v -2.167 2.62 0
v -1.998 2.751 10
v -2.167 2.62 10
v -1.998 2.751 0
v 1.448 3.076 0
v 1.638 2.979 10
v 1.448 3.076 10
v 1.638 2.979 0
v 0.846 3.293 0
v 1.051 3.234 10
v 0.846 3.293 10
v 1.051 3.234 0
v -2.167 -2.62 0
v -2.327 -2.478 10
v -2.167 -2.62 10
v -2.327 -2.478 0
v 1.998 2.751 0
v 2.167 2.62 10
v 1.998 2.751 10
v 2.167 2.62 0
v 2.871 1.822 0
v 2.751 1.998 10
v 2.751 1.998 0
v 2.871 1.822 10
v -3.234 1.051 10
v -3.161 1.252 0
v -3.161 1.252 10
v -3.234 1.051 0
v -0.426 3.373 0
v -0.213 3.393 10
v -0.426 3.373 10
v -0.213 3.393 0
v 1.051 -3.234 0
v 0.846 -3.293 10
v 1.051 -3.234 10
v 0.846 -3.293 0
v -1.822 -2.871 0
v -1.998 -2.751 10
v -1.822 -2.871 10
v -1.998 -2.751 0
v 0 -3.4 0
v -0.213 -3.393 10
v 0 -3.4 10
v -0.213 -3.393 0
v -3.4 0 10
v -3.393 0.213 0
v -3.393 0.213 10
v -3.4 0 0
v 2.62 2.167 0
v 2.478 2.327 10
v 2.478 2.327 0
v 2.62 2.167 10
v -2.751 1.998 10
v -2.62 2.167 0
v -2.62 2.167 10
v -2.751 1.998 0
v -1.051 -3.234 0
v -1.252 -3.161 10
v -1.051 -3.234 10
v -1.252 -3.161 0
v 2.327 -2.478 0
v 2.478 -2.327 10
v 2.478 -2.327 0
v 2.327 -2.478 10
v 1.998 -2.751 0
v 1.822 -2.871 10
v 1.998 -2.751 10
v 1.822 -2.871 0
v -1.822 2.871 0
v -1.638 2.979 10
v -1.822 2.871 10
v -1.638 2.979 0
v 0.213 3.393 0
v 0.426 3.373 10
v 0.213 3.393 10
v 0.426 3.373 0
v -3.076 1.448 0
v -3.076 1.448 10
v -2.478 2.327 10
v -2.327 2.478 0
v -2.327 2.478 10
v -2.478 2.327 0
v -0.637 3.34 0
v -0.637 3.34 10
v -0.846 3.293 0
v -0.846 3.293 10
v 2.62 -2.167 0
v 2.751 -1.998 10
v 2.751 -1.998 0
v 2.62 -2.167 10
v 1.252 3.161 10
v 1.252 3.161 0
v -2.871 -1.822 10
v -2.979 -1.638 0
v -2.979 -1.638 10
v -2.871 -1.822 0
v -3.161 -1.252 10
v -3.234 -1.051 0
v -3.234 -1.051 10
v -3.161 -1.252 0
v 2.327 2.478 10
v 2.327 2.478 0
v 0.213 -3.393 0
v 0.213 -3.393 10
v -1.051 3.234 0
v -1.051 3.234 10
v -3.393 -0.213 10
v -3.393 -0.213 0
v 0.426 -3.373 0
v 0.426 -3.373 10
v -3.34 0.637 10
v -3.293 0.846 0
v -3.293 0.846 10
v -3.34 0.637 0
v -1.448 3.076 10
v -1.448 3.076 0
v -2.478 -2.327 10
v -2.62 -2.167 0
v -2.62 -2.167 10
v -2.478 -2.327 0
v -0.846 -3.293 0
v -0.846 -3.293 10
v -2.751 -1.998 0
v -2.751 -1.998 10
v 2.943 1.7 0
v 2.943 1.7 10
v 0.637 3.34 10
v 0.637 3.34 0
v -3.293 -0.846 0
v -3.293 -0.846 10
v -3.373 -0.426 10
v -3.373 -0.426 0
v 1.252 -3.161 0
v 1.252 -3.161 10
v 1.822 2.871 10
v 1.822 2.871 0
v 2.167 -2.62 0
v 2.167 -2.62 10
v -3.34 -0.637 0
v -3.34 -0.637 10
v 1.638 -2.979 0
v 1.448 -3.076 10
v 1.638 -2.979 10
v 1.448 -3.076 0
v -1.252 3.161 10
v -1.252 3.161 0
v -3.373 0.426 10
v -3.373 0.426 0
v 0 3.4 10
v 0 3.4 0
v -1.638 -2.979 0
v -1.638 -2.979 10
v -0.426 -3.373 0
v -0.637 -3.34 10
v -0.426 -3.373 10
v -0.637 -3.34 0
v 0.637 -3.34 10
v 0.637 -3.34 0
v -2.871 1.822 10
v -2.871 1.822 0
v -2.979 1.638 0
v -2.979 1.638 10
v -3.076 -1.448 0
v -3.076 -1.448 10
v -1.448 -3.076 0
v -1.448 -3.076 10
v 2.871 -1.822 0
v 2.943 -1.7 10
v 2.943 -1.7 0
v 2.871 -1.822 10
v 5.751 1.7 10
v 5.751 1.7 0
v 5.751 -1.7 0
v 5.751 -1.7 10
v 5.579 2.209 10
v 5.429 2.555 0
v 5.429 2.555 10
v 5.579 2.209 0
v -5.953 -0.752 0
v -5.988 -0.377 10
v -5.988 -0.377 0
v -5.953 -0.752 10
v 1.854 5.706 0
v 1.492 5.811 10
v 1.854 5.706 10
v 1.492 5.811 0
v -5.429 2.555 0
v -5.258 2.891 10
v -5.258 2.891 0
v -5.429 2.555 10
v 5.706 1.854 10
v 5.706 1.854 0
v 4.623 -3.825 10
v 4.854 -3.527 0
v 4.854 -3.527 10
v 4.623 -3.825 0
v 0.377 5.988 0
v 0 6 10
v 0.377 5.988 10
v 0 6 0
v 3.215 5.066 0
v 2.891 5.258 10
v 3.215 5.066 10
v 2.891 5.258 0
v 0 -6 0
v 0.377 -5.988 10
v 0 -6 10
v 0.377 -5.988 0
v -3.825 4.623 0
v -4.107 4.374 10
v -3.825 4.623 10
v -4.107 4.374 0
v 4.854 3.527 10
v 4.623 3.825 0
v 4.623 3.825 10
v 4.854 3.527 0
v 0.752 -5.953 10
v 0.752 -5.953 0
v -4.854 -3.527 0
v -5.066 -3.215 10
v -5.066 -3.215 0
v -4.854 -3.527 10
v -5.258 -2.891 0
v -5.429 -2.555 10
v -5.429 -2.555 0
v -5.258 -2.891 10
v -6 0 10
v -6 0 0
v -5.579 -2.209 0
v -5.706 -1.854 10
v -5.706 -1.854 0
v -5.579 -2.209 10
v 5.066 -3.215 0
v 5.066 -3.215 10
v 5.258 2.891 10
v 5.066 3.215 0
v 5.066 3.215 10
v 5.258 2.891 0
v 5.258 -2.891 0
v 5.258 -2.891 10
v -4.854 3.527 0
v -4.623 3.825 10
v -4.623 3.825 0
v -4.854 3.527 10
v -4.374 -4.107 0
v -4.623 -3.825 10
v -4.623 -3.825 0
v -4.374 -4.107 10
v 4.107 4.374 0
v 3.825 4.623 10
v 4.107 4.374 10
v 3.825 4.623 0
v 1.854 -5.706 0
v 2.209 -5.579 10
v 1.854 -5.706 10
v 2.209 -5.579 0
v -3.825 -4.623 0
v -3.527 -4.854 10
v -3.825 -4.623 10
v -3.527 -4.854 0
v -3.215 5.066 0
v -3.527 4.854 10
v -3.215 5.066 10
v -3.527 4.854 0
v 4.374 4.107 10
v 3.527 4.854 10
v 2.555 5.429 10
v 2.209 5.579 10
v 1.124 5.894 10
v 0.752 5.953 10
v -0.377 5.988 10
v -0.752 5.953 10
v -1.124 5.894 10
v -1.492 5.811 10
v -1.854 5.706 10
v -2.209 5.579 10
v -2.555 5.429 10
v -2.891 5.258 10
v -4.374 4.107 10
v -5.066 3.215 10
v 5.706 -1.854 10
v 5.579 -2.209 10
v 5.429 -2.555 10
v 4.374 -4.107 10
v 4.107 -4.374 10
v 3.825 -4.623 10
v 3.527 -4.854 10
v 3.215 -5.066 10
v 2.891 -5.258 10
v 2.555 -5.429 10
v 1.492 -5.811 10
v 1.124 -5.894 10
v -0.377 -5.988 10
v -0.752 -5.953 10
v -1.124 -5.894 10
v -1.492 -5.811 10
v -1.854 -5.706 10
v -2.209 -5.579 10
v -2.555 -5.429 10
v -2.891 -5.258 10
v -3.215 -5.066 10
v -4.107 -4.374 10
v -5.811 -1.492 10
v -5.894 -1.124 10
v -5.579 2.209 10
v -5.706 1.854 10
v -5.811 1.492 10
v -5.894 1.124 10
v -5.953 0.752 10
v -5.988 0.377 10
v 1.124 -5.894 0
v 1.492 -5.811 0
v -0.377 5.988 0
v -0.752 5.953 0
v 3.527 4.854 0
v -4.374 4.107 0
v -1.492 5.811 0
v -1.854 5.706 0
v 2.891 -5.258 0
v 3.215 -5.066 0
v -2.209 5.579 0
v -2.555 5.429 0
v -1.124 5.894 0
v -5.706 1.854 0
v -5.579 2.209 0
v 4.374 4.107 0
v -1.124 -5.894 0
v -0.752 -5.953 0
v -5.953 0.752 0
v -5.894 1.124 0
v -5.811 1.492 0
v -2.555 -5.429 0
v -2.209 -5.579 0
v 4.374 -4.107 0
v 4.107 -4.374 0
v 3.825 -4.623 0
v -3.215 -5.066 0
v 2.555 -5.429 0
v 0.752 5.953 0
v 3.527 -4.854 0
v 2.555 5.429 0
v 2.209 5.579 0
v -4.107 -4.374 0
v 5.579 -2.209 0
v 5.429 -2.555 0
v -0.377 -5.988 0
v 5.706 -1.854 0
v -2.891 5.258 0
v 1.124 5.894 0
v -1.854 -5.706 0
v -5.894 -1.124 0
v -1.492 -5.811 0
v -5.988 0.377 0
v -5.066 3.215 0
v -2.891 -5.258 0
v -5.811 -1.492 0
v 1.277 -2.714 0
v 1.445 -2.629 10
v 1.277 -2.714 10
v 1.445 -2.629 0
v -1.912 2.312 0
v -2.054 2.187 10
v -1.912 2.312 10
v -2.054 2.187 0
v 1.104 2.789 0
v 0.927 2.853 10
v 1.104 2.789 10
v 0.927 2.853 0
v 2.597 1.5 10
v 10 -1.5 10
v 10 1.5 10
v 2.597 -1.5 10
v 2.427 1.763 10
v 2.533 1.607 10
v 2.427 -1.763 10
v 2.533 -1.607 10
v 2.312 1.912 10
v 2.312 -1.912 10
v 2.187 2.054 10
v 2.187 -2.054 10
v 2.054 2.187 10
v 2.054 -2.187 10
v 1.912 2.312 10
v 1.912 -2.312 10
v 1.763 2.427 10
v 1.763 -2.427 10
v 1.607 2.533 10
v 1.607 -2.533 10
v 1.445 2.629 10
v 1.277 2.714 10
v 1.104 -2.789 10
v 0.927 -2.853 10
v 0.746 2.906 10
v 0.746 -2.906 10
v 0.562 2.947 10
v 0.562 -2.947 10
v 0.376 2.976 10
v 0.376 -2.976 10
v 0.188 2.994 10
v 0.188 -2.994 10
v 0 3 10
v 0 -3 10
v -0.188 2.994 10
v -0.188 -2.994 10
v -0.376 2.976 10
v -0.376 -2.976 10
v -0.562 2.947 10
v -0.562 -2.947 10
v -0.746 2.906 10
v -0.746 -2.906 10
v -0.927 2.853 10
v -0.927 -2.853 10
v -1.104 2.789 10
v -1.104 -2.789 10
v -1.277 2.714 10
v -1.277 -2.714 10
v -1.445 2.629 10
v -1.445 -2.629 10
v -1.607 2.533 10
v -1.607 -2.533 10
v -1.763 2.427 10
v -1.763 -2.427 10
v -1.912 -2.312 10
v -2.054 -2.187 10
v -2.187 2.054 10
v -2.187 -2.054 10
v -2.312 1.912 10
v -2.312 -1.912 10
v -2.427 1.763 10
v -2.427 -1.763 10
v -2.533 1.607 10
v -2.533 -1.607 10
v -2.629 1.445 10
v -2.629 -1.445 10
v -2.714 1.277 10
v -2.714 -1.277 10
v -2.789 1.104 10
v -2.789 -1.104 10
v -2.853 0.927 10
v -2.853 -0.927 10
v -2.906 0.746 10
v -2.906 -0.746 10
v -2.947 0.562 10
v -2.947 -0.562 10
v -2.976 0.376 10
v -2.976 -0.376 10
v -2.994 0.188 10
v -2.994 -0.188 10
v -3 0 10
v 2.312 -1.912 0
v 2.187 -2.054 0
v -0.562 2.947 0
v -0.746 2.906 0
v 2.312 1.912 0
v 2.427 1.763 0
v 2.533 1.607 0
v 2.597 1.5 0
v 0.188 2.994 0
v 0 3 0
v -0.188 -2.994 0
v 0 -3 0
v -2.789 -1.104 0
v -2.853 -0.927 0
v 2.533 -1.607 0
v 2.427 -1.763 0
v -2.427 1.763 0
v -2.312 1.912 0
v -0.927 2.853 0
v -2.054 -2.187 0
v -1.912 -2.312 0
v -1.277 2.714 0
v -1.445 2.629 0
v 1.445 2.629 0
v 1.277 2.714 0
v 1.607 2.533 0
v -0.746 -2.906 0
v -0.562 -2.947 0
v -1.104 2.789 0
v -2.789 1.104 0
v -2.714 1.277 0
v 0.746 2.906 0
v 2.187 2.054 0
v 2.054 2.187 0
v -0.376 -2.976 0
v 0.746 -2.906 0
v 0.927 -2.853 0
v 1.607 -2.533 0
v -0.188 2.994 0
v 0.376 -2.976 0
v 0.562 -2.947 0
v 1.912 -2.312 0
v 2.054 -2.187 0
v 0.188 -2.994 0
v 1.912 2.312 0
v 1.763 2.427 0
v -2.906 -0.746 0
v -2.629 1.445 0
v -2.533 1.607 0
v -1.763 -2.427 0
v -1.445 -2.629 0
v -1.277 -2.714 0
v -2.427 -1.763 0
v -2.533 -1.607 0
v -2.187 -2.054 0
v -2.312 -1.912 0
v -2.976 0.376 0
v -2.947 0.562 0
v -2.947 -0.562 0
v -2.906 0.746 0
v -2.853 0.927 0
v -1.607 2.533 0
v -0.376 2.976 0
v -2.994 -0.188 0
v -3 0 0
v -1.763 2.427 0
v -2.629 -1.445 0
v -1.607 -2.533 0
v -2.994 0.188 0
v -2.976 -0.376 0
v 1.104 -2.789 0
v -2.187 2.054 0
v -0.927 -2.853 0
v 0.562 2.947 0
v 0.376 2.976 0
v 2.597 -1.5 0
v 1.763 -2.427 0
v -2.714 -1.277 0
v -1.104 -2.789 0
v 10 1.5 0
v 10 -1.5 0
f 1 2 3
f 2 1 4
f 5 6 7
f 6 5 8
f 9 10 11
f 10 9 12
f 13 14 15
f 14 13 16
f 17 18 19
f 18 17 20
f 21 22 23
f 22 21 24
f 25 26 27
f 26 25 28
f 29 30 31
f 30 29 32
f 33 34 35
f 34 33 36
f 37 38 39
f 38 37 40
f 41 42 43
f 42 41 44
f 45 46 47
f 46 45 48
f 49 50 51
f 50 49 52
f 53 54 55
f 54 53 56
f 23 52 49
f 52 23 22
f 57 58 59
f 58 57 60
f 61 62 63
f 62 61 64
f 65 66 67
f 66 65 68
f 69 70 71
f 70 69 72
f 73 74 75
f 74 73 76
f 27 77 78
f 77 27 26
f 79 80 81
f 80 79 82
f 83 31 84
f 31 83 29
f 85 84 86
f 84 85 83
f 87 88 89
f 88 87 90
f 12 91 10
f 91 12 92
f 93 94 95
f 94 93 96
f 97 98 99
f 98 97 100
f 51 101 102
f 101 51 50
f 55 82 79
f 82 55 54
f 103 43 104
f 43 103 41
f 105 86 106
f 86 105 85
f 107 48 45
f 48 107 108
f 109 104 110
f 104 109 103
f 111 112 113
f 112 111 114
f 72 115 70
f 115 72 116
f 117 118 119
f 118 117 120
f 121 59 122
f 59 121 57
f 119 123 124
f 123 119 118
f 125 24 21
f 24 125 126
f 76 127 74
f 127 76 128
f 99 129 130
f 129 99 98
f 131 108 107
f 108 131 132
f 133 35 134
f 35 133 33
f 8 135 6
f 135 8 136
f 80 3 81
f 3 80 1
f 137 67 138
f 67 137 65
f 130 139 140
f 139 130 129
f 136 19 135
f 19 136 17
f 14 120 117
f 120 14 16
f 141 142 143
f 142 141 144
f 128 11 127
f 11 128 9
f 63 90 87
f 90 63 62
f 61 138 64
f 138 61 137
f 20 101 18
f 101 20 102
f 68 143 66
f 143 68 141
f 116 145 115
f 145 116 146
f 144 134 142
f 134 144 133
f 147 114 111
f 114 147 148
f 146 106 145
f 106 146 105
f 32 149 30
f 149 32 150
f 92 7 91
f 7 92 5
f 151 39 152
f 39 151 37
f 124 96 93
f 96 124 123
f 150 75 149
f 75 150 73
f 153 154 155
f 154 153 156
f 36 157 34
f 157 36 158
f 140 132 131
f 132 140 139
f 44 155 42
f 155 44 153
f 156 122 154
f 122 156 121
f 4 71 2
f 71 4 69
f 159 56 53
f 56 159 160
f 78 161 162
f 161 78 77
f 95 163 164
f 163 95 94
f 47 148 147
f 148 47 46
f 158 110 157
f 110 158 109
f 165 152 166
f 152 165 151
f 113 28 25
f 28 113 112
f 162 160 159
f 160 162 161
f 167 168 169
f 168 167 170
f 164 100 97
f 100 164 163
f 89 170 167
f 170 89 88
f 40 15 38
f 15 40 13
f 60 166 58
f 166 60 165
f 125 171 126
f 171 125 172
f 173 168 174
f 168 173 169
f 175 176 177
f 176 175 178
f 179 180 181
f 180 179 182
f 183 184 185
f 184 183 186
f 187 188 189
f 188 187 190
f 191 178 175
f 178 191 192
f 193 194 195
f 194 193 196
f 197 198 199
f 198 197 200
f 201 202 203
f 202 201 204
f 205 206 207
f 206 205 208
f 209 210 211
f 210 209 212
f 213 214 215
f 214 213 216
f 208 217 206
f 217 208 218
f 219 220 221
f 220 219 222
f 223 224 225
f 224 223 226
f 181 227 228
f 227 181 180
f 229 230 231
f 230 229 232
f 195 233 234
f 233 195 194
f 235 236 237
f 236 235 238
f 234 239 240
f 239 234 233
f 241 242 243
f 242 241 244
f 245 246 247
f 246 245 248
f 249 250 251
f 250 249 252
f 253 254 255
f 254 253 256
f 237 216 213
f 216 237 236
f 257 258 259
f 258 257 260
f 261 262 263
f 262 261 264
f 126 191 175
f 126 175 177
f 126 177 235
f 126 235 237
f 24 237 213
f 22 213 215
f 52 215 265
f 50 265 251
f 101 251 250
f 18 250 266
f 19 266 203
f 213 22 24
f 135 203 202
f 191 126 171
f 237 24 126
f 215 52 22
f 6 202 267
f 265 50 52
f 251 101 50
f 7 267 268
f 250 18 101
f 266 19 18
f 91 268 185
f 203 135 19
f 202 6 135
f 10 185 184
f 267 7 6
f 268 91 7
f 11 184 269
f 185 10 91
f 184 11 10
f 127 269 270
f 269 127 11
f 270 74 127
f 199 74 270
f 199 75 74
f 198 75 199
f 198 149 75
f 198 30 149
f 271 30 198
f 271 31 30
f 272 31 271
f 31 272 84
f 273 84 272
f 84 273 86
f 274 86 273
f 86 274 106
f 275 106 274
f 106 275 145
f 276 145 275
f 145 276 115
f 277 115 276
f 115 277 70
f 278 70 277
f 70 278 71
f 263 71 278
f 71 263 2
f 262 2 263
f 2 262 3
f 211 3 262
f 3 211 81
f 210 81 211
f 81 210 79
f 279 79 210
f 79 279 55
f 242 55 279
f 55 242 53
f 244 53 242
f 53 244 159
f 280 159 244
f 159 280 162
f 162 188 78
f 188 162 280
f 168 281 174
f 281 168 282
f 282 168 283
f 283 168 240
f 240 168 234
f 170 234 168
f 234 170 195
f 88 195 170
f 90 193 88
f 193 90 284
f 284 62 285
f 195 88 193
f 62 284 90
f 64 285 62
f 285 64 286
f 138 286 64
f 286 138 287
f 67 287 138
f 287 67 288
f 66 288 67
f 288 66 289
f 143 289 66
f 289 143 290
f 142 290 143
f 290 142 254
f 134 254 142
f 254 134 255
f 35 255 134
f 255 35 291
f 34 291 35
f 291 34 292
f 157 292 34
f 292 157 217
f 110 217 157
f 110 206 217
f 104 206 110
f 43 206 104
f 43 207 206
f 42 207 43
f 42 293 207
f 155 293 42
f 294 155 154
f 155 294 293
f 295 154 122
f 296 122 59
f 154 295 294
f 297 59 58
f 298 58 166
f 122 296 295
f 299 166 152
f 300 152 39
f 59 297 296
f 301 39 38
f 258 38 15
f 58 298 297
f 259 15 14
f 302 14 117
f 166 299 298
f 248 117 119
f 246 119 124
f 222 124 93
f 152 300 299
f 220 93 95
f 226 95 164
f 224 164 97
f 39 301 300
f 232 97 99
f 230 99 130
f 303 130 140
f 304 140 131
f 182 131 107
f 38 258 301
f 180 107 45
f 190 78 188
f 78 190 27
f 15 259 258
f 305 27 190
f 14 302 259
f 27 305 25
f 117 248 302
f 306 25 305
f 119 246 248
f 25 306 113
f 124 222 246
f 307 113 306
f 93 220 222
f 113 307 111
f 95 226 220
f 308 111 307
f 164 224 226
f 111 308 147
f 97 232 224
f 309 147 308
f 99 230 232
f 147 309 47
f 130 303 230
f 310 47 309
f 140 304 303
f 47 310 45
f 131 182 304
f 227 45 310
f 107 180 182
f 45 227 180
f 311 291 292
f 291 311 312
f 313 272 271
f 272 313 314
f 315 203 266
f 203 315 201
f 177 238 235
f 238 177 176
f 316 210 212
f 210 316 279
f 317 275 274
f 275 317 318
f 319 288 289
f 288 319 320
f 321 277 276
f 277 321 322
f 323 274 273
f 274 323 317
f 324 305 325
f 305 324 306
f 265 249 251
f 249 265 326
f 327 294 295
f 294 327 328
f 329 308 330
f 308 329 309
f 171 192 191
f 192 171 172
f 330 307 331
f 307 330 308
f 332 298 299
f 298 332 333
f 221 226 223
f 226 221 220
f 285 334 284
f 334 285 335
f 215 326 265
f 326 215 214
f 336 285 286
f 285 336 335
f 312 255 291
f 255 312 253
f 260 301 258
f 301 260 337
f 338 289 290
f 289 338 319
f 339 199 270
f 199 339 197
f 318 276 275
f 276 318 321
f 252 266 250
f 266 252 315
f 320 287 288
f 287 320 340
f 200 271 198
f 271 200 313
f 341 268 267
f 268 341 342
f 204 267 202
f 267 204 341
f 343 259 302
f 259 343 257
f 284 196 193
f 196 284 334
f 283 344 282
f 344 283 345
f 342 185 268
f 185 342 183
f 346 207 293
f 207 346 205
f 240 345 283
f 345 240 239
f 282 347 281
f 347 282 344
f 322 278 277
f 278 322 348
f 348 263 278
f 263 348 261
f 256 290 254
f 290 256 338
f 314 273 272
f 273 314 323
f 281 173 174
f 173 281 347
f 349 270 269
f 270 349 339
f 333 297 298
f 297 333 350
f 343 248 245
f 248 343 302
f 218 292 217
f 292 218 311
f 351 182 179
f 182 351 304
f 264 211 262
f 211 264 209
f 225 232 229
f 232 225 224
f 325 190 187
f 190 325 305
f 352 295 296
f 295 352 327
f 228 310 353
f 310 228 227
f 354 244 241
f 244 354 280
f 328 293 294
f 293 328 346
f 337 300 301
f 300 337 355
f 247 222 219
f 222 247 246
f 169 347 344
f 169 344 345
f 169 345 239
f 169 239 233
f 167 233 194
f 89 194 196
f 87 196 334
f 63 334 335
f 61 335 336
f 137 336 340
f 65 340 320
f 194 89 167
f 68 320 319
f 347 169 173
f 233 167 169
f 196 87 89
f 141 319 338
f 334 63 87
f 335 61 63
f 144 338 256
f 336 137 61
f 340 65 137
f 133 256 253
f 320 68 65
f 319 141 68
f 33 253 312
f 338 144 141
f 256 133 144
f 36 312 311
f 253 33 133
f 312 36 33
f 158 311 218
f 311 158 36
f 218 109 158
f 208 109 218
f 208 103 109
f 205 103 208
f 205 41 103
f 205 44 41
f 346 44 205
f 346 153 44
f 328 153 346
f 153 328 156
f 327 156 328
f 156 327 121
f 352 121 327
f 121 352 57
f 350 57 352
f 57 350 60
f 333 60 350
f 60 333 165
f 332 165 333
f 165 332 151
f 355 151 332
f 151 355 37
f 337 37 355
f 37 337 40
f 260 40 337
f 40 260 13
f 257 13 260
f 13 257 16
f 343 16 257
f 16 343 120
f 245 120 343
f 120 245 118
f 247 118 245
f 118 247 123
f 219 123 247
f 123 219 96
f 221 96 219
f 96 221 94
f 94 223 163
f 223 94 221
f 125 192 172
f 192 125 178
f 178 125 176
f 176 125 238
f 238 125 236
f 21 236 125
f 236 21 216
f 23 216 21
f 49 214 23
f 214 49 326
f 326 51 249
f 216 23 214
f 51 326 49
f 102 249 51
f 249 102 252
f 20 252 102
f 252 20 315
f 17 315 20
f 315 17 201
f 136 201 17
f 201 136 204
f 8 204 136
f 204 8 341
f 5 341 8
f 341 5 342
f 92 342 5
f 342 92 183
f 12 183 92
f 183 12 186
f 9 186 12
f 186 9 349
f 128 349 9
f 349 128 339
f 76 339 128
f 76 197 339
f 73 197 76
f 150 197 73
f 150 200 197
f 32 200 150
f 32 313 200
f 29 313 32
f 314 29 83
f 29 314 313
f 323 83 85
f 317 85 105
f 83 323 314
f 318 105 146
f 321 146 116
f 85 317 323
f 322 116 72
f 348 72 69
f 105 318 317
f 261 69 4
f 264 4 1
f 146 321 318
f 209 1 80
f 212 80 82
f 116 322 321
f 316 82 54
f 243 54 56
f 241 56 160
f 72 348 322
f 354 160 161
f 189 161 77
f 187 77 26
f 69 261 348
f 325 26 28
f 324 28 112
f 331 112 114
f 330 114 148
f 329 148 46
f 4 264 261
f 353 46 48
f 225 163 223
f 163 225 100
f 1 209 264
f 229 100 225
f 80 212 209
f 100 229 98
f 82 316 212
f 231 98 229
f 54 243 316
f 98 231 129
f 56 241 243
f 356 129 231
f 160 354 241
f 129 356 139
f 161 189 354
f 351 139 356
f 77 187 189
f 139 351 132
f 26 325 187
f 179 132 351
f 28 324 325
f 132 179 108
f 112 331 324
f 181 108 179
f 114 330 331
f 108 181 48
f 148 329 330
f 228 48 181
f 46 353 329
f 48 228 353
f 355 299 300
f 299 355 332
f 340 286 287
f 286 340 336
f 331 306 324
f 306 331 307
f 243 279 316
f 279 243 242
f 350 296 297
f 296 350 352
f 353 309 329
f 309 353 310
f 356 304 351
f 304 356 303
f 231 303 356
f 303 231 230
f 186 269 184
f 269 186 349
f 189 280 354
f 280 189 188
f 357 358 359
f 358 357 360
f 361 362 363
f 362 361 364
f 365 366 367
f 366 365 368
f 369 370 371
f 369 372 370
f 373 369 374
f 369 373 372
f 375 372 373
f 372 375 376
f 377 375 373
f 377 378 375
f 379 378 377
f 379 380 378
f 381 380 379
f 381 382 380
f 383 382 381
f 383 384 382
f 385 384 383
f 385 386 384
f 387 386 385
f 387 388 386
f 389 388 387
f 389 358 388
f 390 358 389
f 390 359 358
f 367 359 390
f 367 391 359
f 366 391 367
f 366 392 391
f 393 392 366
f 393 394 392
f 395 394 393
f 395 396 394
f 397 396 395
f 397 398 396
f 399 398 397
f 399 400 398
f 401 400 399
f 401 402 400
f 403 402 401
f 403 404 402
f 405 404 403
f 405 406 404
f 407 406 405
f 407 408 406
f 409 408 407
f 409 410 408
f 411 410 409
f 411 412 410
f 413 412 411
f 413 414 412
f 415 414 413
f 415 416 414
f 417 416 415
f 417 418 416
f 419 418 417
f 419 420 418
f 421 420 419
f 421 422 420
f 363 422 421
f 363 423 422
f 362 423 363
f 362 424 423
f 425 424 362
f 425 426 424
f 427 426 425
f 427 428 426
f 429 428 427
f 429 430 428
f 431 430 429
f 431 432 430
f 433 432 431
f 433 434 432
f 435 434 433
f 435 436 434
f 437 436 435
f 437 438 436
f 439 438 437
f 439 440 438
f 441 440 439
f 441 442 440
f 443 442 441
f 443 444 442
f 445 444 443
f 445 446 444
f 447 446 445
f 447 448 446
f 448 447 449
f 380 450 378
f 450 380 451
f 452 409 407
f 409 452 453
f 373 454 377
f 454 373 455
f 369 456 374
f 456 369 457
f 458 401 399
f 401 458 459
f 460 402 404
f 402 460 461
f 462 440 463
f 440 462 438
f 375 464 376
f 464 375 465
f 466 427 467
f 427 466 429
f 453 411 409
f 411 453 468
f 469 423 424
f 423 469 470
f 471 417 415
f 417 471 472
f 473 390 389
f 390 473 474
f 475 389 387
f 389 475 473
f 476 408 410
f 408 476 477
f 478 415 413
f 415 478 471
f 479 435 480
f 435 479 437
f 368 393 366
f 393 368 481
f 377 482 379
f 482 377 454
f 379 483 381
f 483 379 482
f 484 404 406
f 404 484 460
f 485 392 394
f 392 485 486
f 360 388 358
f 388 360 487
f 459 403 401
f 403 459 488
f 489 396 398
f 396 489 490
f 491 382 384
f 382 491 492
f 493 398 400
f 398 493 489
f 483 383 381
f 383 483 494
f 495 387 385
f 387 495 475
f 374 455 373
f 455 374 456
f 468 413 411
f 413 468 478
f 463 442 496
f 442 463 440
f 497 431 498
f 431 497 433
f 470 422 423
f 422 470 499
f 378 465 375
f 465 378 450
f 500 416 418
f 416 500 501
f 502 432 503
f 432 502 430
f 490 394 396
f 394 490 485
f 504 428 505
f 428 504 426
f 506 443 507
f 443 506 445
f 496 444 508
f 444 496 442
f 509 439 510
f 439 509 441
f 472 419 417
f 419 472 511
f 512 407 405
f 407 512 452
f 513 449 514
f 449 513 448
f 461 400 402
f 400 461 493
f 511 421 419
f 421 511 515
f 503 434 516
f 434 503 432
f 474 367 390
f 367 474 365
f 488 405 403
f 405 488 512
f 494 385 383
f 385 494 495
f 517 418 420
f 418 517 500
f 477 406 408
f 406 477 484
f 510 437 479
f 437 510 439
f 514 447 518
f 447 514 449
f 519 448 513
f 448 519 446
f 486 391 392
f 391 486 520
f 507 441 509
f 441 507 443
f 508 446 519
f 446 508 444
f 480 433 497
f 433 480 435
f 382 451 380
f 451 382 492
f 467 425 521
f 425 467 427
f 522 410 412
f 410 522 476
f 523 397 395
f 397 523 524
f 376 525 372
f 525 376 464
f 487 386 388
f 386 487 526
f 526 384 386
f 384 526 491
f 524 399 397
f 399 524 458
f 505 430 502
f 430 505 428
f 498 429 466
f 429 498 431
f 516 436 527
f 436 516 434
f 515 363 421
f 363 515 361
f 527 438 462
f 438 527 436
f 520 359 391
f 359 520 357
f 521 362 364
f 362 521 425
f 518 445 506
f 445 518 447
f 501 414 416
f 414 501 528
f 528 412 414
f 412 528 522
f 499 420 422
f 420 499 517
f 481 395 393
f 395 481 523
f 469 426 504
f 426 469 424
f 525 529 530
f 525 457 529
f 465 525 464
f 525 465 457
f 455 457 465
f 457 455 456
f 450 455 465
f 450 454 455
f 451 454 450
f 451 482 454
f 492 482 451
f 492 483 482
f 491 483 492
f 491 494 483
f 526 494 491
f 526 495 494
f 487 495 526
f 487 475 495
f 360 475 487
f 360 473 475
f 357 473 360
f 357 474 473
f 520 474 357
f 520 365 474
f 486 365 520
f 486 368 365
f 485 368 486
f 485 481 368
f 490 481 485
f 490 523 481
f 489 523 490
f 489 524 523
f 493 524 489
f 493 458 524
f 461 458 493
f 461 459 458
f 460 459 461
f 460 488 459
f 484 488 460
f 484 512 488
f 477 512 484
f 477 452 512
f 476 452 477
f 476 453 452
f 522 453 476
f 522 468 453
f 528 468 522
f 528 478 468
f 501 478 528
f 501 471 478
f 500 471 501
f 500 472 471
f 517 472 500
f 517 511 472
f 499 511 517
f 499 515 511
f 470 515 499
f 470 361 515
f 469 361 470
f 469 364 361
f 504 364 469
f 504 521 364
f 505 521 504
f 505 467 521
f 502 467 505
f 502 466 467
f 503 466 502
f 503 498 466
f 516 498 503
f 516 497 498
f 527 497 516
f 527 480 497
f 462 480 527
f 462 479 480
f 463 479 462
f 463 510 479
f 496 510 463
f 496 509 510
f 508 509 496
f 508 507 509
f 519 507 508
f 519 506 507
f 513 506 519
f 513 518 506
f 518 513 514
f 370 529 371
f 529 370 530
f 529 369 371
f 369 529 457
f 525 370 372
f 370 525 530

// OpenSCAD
module gubg_key(h,ri,l)
{
    cylinder(h,ri,ri);
    translate([0,-ri/2,0])
    cube([l,ri,h]);
}

module gubg_lock(h,ro,ri)
{
    difference()
    {
        cylinder(h,ro,ro);

        translate([0,0,-$fs])
        gubg_key(h+2*$fs,ri,ro+$fs);
    }
}

$fn = 100;
$fs = 0.01;

color([0,1,0])
    gubg_lock(10, 6, 3+0.4);

color([1,0,0])
    gubg_key(10, 3, 10);
